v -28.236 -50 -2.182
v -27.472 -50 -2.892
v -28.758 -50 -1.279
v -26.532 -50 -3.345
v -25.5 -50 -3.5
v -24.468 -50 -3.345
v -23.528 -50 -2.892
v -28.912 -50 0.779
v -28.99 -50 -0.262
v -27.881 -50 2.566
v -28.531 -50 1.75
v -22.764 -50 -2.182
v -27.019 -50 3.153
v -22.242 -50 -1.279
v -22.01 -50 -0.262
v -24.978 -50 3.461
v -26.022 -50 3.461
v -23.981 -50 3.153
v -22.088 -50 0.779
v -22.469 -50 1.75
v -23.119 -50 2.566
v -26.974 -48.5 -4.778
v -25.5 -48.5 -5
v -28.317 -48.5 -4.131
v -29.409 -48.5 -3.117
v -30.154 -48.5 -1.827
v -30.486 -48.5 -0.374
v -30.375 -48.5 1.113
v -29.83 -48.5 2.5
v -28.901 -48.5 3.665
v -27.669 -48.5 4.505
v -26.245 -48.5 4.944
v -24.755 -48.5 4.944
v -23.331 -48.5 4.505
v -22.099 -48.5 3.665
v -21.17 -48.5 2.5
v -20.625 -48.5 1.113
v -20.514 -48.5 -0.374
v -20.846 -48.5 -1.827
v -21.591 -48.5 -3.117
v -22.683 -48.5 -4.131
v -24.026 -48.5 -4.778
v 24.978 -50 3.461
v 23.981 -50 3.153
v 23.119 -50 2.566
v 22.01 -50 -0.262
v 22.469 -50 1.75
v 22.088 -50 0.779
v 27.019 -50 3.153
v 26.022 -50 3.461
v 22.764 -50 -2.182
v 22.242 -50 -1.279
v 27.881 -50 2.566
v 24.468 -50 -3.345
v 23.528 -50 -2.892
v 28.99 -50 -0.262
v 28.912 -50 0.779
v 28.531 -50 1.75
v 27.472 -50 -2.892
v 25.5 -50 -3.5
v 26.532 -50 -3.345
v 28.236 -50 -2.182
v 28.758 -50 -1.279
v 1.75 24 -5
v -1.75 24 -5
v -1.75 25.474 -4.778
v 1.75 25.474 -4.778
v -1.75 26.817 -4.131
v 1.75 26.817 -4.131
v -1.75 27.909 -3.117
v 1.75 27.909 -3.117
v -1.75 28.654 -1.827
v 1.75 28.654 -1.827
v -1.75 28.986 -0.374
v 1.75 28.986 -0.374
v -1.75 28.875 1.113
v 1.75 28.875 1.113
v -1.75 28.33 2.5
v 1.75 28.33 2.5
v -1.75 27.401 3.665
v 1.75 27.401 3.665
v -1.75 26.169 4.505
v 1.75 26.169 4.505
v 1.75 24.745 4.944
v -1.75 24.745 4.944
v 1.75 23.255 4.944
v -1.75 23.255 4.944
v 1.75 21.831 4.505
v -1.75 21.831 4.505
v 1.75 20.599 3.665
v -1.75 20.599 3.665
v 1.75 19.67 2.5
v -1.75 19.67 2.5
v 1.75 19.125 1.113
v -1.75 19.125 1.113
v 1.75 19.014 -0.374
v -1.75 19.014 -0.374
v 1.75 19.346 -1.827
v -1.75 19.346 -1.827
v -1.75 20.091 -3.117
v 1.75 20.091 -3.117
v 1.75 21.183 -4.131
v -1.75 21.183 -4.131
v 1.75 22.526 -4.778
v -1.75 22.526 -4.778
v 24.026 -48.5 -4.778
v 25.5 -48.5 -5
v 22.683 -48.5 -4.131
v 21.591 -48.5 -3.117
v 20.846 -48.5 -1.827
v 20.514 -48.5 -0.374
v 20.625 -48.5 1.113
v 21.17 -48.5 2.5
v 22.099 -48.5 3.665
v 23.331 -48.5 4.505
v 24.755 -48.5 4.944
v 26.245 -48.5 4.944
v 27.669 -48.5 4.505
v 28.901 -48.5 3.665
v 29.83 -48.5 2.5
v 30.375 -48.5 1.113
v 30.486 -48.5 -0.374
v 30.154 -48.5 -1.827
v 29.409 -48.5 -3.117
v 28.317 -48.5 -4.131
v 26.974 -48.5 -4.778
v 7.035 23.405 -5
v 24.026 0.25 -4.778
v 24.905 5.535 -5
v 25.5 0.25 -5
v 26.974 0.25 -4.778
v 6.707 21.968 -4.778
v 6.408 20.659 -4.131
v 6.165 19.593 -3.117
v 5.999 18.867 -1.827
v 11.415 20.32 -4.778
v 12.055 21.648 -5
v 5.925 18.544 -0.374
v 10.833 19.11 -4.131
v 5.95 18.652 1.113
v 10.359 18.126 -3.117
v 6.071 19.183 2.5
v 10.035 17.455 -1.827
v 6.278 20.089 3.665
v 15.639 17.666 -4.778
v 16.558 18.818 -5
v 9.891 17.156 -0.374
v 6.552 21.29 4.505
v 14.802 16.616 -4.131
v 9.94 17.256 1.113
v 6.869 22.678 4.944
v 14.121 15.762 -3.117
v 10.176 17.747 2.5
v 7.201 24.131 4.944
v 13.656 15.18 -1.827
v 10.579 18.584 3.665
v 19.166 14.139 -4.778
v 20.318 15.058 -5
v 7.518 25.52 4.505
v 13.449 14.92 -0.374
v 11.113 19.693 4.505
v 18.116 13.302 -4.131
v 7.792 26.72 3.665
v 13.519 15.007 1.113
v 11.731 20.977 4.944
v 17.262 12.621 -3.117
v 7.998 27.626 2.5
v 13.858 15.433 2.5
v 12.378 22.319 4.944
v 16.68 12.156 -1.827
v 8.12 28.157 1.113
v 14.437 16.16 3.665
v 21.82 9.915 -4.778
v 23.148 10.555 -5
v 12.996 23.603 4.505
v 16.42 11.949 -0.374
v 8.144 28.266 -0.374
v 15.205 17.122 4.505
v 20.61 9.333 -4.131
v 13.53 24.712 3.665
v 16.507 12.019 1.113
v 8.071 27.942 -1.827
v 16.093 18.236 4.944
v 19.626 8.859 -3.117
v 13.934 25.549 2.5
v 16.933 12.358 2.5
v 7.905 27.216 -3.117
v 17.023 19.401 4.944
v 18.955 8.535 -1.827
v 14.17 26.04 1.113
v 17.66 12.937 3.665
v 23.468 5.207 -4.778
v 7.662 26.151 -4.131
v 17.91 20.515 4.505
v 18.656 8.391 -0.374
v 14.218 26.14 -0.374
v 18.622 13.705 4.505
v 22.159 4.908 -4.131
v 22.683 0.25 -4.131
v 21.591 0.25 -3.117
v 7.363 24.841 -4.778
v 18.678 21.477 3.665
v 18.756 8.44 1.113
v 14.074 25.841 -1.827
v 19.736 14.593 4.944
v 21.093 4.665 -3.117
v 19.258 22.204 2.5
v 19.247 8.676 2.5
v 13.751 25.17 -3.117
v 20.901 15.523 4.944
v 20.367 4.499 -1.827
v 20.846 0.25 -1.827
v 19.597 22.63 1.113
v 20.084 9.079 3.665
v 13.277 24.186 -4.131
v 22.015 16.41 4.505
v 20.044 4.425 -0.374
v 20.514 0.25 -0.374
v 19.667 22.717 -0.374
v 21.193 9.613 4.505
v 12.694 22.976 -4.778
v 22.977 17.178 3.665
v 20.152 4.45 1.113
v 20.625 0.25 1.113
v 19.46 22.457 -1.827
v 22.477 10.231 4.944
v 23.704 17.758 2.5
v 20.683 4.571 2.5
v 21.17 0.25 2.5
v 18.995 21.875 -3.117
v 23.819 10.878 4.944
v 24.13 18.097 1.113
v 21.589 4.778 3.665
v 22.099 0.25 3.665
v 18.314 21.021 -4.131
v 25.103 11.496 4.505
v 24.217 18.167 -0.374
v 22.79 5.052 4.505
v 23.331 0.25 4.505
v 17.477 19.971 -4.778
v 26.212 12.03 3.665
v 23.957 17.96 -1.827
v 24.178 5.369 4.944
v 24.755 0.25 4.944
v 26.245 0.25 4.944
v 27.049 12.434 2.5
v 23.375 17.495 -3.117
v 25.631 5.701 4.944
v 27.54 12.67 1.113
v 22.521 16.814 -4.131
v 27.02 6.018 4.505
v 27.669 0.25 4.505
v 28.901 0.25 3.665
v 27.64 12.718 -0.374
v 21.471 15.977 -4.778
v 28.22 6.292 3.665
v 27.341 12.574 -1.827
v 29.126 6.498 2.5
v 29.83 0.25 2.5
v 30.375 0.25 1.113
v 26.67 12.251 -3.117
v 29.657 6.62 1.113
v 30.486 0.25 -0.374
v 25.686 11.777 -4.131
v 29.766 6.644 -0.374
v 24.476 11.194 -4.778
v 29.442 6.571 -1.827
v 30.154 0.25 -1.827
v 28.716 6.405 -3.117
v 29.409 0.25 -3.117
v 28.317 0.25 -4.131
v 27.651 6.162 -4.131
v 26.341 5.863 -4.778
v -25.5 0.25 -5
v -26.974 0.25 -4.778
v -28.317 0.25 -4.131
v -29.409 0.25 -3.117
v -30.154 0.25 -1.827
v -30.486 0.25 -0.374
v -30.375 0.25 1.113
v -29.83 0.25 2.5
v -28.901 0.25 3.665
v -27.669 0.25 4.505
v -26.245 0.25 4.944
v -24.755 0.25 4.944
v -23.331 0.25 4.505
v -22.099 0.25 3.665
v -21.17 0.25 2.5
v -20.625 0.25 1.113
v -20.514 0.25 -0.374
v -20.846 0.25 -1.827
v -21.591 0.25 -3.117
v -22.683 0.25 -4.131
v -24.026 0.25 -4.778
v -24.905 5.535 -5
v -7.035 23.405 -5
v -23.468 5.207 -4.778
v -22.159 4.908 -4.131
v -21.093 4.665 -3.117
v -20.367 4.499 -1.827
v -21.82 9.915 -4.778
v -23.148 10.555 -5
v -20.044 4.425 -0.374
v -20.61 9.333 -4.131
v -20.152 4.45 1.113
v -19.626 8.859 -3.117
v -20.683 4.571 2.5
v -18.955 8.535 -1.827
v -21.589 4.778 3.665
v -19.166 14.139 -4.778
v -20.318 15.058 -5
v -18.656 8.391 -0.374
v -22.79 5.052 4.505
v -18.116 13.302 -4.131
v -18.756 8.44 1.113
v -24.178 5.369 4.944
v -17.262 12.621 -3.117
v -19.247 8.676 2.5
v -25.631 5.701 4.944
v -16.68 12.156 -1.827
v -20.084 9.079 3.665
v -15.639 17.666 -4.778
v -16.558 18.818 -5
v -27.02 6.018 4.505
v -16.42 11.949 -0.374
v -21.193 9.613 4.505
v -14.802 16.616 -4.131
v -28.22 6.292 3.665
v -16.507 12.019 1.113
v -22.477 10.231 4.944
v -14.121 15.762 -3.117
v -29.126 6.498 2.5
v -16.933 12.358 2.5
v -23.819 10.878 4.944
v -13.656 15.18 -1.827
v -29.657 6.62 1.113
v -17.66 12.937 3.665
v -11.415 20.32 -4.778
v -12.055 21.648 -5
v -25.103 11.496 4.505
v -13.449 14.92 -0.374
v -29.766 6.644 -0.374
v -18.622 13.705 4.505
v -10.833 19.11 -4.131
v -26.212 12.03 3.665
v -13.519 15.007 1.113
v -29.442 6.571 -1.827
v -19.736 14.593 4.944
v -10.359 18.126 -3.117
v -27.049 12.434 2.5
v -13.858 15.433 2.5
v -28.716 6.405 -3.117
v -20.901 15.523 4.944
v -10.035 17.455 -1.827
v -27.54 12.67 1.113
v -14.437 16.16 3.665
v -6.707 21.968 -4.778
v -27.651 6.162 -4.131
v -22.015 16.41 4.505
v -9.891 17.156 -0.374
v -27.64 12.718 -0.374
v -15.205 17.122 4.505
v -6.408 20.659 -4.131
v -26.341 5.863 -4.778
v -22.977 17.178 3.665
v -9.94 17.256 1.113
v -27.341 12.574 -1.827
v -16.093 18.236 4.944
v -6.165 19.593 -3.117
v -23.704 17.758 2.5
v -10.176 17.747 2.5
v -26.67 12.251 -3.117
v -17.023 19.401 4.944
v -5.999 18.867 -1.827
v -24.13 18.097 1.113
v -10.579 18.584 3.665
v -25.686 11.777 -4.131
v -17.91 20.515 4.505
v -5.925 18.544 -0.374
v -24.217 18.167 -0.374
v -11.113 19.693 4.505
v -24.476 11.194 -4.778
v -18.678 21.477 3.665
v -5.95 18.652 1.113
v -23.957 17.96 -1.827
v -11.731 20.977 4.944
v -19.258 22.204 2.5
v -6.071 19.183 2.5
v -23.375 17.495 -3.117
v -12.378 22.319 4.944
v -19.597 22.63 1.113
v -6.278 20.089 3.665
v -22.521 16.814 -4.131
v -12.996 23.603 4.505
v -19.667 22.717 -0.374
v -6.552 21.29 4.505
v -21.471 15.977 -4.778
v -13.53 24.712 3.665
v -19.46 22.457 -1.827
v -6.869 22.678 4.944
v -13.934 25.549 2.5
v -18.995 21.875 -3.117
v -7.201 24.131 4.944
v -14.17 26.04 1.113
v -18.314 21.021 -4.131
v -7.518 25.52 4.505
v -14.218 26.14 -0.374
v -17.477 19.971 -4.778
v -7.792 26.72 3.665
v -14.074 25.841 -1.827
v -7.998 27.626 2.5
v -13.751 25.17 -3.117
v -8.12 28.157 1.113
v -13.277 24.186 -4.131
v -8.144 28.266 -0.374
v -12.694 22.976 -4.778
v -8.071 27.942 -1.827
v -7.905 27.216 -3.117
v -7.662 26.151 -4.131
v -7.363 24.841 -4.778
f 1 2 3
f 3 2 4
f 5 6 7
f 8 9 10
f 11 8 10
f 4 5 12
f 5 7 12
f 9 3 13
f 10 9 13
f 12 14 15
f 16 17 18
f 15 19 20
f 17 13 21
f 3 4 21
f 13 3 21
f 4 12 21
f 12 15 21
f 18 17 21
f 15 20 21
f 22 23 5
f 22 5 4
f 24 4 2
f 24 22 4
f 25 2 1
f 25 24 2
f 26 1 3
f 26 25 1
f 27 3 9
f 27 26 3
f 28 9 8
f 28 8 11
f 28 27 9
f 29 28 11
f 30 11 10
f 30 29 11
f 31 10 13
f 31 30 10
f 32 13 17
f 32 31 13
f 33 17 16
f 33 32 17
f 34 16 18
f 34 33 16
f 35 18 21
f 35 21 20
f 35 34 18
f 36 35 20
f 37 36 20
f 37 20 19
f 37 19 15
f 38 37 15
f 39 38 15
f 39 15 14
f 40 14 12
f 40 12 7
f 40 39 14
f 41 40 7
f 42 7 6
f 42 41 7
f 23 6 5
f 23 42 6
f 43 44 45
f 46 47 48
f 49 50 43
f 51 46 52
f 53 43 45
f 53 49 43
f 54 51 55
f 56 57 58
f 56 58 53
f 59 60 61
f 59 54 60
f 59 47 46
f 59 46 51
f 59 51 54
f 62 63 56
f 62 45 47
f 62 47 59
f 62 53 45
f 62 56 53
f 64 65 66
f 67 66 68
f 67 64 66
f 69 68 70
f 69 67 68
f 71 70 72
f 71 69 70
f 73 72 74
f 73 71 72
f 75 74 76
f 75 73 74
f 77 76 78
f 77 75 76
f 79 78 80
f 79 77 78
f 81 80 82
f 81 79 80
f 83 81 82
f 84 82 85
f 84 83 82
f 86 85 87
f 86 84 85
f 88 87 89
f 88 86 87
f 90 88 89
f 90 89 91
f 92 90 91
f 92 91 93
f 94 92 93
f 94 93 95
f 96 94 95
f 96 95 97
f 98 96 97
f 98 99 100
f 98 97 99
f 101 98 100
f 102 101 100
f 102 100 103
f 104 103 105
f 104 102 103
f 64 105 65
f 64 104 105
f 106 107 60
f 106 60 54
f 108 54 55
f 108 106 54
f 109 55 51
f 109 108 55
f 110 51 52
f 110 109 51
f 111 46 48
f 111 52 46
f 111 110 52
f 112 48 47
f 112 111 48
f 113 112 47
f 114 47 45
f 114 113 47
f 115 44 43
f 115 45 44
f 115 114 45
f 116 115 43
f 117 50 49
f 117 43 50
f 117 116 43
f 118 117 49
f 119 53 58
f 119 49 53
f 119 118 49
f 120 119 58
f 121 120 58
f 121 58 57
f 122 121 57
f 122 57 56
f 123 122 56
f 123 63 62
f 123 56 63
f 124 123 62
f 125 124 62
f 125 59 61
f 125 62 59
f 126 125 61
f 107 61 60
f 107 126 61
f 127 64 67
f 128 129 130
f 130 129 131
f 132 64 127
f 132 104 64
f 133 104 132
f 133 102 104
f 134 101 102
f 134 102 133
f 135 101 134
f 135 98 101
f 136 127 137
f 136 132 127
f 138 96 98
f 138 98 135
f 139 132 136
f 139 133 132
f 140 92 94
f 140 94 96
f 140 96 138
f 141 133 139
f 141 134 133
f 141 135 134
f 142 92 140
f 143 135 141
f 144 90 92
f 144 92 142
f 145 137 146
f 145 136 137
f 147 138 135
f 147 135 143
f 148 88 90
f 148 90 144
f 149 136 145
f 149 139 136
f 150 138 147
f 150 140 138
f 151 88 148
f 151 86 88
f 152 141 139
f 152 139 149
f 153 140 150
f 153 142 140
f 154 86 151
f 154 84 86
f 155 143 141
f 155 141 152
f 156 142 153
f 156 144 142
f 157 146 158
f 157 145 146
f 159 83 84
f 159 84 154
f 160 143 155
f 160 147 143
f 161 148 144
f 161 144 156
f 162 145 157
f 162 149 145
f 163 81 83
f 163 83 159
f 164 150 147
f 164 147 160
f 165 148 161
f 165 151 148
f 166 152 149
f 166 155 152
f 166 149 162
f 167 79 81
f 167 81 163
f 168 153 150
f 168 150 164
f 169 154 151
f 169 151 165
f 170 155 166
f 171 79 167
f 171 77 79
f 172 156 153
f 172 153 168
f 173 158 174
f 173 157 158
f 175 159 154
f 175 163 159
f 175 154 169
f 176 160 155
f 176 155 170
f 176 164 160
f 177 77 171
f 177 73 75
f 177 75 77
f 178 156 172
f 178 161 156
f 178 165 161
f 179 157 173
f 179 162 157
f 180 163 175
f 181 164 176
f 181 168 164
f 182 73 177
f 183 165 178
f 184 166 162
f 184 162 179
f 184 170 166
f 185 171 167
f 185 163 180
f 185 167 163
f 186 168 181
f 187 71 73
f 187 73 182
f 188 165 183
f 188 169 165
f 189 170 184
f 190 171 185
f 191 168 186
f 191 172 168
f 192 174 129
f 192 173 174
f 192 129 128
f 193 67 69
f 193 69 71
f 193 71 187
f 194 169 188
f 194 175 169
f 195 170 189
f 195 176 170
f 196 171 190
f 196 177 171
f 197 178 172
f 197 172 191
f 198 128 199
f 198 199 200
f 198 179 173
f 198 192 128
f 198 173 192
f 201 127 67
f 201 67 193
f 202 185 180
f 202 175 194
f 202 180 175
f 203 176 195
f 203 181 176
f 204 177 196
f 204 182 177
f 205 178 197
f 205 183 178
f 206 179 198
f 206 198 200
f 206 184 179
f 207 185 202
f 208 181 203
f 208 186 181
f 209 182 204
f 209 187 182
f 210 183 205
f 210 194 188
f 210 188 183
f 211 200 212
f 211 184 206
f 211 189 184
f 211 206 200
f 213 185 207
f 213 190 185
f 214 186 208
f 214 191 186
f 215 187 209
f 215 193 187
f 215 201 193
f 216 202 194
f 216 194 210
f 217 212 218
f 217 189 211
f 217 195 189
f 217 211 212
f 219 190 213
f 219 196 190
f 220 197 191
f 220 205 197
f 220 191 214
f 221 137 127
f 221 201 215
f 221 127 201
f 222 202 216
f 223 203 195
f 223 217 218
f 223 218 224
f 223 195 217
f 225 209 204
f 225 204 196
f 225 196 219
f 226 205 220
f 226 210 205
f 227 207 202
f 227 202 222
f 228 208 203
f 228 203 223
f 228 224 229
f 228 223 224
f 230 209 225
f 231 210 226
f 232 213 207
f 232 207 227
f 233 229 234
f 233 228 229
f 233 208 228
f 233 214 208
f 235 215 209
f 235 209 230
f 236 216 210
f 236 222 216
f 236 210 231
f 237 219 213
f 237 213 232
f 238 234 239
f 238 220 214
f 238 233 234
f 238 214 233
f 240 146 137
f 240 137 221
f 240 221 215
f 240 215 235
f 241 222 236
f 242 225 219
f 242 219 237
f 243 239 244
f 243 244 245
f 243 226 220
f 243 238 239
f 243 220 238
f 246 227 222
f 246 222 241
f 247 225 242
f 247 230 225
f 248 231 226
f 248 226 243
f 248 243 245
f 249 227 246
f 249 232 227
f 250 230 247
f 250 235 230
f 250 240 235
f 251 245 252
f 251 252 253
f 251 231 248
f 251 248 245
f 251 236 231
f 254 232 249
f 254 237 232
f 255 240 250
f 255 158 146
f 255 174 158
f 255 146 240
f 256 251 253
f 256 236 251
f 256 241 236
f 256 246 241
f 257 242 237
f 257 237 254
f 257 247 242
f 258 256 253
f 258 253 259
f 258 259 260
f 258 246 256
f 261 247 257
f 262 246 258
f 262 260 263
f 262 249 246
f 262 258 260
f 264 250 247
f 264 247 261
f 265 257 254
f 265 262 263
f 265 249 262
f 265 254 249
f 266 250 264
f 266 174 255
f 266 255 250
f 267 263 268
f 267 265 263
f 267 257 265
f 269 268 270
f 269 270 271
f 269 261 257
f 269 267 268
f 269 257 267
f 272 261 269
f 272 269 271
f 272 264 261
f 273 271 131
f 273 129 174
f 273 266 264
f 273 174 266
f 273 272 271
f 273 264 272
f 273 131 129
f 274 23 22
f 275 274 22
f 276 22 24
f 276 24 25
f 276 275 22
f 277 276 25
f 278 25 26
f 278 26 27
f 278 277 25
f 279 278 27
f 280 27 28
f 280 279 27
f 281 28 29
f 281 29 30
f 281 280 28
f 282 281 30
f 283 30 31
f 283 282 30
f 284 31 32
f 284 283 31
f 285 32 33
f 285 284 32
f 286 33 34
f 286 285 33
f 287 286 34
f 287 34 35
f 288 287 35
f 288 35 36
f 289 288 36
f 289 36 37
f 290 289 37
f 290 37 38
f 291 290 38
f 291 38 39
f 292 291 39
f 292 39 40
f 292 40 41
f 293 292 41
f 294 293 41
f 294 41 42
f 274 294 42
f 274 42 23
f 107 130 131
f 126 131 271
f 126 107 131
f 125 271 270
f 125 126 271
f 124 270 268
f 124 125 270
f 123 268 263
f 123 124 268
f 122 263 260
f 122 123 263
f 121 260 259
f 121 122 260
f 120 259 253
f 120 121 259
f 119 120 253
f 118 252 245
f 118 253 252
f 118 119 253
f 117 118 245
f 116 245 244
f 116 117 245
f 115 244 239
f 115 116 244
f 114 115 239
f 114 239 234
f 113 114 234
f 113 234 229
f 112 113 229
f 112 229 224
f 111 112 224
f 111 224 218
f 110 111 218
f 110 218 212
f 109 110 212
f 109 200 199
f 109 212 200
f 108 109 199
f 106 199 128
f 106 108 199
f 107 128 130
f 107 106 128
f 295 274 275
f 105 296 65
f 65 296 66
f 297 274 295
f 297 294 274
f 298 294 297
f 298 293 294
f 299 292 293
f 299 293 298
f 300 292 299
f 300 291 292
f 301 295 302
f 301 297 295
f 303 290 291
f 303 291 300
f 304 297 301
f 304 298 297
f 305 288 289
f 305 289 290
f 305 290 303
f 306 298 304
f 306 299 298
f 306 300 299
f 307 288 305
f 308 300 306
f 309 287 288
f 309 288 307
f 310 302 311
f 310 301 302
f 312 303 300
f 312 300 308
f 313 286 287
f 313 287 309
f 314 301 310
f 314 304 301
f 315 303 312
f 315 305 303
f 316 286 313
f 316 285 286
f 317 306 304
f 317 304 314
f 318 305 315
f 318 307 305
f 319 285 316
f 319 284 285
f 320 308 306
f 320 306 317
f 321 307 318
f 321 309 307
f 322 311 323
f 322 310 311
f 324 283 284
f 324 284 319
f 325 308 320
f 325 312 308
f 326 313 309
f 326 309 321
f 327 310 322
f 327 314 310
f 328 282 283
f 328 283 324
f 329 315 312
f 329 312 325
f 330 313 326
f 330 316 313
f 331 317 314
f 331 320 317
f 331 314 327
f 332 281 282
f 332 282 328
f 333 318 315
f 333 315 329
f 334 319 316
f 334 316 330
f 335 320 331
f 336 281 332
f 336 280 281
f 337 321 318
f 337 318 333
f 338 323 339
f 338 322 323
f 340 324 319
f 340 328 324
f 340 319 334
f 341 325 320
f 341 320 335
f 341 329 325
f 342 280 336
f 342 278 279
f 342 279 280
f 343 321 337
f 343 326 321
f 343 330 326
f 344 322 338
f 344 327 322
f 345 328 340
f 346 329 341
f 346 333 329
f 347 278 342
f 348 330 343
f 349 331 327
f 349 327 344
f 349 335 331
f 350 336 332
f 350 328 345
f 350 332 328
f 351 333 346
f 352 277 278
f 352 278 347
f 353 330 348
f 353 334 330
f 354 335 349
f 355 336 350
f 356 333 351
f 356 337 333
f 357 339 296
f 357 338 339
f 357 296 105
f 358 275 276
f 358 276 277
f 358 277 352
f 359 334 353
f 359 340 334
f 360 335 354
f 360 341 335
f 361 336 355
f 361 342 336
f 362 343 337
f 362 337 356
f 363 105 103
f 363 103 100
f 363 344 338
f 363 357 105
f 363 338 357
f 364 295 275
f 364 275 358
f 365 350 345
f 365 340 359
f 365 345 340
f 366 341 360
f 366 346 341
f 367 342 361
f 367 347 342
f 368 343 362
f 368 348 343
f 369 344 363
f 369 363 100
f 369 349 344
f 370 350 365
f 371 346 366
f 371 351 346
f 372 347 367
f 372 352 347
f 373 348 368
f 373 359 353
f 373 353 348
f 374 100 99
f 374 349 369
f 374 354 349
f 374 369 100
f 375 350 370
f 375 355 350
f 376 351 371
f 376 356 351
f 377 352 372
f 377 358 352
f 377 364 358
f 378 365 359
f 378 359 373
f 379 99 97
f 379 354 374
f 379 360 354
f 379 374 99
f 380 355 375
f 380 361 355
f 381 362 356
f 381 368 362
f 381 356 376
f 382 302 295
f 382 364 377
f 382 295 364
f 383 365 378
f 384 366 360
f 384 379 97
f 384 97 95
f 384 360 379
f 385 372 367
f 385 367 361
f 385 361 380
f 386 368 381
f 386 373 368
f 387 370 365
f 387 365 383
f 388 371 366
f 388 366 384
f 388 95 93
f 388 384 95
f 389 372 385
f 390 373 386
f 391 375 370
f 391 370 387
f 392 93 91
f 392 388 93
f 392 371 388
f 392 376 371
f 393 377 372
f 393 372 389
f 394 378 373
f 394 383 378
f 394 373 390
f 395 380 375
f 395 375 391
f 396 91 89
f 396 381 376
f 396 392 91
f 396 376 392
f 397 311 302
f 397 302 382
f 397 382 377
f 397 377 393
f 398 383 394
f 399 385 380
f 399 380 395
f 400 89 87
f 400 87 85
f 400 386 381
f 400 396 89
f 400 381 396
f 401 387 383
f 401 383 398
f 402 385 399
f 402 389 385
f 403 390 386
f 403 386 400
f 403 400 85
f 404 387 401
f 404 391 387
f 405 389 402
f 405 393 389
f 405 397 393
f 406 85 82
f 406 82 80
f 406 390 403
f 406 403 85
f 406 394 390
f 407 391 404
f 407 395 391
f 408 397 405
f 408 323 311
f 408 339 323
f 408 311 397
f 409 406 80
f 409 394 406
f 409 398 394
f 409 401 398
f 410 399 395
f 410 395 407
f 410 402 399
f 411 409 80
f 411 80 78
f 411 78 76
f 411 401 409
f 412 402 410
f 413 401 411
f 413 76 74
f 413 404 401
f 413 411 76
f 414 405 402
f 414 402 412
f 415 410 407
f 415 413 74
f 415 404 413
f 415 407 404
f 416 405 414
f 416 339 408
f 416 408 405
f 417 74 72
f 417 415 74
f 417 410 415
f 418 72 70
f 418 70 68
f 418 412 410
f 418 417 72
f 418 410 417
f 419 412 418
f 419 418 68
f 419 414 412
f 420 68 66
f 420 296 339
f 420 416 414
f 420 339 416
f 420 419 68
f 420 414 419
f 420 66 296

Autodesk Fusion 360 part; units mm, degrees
sketch "Sketch1" plane through (0, 0, 0) normal (0, 0, 1) x (1, 0, 0)
  circle A0 centre (0, 0) radius 19 construction
  circle A1 centre (0, 0) radius 24 construction
  line L0 (-24, 0.0214) -> (24, 0.0214) construction
  line L1 (0, 0) -> (0, -50) construction
  line L2 (-25.5, 0) -> (-25.5, -50)
  line L3 (25.5, 0) -> (25.5, -50)
  line L4 (0, 0) -> (0, 24) construction
  line L5 (-25.5, 0) -> (-25.5, 0.25)
  line L6 (0, 24) -> (-1.75, 24)
  arc A2 (-1.75, 24) -> (-25.5, 0.25) centre (-1.75, 0.25) ccw
  arc A3 (25.5, 0.25) -> (1.75, 24) centre (1.75, 0.25) ccw
  line L7 (0, 24) -> (1.75, 24)
  line L8 (25.5, 0) -> (25.5, 0.25)
  dimension "d1" = 38
  dimension "d2" = 5
  dimension "d3" = 50
  dimension "d4" = 25.5
  dimension "d5" = 25.5
  dimension "d6" = 23.75
sketch "Sketch2" plane through (0, 0, 0) normal (1, 0, 0) x (0, 0, -1)
  circle A0 centre (0, 24) radius 5
  point P0 (0, 24)
  dimension "d7" = 10
sweep "Sweep1" add profiles "Sketch2" path "Sketch1" along L3 L8 A3 L7 L6 A2 L5 L2 section 1
chamfer "Chamfer1" distance 1.5 angle 45 2 edges at (-27.3081, -50, 4.6616) (23.6919, -50, 4.6616)
thread "Thread1"
thread "Thread2"
